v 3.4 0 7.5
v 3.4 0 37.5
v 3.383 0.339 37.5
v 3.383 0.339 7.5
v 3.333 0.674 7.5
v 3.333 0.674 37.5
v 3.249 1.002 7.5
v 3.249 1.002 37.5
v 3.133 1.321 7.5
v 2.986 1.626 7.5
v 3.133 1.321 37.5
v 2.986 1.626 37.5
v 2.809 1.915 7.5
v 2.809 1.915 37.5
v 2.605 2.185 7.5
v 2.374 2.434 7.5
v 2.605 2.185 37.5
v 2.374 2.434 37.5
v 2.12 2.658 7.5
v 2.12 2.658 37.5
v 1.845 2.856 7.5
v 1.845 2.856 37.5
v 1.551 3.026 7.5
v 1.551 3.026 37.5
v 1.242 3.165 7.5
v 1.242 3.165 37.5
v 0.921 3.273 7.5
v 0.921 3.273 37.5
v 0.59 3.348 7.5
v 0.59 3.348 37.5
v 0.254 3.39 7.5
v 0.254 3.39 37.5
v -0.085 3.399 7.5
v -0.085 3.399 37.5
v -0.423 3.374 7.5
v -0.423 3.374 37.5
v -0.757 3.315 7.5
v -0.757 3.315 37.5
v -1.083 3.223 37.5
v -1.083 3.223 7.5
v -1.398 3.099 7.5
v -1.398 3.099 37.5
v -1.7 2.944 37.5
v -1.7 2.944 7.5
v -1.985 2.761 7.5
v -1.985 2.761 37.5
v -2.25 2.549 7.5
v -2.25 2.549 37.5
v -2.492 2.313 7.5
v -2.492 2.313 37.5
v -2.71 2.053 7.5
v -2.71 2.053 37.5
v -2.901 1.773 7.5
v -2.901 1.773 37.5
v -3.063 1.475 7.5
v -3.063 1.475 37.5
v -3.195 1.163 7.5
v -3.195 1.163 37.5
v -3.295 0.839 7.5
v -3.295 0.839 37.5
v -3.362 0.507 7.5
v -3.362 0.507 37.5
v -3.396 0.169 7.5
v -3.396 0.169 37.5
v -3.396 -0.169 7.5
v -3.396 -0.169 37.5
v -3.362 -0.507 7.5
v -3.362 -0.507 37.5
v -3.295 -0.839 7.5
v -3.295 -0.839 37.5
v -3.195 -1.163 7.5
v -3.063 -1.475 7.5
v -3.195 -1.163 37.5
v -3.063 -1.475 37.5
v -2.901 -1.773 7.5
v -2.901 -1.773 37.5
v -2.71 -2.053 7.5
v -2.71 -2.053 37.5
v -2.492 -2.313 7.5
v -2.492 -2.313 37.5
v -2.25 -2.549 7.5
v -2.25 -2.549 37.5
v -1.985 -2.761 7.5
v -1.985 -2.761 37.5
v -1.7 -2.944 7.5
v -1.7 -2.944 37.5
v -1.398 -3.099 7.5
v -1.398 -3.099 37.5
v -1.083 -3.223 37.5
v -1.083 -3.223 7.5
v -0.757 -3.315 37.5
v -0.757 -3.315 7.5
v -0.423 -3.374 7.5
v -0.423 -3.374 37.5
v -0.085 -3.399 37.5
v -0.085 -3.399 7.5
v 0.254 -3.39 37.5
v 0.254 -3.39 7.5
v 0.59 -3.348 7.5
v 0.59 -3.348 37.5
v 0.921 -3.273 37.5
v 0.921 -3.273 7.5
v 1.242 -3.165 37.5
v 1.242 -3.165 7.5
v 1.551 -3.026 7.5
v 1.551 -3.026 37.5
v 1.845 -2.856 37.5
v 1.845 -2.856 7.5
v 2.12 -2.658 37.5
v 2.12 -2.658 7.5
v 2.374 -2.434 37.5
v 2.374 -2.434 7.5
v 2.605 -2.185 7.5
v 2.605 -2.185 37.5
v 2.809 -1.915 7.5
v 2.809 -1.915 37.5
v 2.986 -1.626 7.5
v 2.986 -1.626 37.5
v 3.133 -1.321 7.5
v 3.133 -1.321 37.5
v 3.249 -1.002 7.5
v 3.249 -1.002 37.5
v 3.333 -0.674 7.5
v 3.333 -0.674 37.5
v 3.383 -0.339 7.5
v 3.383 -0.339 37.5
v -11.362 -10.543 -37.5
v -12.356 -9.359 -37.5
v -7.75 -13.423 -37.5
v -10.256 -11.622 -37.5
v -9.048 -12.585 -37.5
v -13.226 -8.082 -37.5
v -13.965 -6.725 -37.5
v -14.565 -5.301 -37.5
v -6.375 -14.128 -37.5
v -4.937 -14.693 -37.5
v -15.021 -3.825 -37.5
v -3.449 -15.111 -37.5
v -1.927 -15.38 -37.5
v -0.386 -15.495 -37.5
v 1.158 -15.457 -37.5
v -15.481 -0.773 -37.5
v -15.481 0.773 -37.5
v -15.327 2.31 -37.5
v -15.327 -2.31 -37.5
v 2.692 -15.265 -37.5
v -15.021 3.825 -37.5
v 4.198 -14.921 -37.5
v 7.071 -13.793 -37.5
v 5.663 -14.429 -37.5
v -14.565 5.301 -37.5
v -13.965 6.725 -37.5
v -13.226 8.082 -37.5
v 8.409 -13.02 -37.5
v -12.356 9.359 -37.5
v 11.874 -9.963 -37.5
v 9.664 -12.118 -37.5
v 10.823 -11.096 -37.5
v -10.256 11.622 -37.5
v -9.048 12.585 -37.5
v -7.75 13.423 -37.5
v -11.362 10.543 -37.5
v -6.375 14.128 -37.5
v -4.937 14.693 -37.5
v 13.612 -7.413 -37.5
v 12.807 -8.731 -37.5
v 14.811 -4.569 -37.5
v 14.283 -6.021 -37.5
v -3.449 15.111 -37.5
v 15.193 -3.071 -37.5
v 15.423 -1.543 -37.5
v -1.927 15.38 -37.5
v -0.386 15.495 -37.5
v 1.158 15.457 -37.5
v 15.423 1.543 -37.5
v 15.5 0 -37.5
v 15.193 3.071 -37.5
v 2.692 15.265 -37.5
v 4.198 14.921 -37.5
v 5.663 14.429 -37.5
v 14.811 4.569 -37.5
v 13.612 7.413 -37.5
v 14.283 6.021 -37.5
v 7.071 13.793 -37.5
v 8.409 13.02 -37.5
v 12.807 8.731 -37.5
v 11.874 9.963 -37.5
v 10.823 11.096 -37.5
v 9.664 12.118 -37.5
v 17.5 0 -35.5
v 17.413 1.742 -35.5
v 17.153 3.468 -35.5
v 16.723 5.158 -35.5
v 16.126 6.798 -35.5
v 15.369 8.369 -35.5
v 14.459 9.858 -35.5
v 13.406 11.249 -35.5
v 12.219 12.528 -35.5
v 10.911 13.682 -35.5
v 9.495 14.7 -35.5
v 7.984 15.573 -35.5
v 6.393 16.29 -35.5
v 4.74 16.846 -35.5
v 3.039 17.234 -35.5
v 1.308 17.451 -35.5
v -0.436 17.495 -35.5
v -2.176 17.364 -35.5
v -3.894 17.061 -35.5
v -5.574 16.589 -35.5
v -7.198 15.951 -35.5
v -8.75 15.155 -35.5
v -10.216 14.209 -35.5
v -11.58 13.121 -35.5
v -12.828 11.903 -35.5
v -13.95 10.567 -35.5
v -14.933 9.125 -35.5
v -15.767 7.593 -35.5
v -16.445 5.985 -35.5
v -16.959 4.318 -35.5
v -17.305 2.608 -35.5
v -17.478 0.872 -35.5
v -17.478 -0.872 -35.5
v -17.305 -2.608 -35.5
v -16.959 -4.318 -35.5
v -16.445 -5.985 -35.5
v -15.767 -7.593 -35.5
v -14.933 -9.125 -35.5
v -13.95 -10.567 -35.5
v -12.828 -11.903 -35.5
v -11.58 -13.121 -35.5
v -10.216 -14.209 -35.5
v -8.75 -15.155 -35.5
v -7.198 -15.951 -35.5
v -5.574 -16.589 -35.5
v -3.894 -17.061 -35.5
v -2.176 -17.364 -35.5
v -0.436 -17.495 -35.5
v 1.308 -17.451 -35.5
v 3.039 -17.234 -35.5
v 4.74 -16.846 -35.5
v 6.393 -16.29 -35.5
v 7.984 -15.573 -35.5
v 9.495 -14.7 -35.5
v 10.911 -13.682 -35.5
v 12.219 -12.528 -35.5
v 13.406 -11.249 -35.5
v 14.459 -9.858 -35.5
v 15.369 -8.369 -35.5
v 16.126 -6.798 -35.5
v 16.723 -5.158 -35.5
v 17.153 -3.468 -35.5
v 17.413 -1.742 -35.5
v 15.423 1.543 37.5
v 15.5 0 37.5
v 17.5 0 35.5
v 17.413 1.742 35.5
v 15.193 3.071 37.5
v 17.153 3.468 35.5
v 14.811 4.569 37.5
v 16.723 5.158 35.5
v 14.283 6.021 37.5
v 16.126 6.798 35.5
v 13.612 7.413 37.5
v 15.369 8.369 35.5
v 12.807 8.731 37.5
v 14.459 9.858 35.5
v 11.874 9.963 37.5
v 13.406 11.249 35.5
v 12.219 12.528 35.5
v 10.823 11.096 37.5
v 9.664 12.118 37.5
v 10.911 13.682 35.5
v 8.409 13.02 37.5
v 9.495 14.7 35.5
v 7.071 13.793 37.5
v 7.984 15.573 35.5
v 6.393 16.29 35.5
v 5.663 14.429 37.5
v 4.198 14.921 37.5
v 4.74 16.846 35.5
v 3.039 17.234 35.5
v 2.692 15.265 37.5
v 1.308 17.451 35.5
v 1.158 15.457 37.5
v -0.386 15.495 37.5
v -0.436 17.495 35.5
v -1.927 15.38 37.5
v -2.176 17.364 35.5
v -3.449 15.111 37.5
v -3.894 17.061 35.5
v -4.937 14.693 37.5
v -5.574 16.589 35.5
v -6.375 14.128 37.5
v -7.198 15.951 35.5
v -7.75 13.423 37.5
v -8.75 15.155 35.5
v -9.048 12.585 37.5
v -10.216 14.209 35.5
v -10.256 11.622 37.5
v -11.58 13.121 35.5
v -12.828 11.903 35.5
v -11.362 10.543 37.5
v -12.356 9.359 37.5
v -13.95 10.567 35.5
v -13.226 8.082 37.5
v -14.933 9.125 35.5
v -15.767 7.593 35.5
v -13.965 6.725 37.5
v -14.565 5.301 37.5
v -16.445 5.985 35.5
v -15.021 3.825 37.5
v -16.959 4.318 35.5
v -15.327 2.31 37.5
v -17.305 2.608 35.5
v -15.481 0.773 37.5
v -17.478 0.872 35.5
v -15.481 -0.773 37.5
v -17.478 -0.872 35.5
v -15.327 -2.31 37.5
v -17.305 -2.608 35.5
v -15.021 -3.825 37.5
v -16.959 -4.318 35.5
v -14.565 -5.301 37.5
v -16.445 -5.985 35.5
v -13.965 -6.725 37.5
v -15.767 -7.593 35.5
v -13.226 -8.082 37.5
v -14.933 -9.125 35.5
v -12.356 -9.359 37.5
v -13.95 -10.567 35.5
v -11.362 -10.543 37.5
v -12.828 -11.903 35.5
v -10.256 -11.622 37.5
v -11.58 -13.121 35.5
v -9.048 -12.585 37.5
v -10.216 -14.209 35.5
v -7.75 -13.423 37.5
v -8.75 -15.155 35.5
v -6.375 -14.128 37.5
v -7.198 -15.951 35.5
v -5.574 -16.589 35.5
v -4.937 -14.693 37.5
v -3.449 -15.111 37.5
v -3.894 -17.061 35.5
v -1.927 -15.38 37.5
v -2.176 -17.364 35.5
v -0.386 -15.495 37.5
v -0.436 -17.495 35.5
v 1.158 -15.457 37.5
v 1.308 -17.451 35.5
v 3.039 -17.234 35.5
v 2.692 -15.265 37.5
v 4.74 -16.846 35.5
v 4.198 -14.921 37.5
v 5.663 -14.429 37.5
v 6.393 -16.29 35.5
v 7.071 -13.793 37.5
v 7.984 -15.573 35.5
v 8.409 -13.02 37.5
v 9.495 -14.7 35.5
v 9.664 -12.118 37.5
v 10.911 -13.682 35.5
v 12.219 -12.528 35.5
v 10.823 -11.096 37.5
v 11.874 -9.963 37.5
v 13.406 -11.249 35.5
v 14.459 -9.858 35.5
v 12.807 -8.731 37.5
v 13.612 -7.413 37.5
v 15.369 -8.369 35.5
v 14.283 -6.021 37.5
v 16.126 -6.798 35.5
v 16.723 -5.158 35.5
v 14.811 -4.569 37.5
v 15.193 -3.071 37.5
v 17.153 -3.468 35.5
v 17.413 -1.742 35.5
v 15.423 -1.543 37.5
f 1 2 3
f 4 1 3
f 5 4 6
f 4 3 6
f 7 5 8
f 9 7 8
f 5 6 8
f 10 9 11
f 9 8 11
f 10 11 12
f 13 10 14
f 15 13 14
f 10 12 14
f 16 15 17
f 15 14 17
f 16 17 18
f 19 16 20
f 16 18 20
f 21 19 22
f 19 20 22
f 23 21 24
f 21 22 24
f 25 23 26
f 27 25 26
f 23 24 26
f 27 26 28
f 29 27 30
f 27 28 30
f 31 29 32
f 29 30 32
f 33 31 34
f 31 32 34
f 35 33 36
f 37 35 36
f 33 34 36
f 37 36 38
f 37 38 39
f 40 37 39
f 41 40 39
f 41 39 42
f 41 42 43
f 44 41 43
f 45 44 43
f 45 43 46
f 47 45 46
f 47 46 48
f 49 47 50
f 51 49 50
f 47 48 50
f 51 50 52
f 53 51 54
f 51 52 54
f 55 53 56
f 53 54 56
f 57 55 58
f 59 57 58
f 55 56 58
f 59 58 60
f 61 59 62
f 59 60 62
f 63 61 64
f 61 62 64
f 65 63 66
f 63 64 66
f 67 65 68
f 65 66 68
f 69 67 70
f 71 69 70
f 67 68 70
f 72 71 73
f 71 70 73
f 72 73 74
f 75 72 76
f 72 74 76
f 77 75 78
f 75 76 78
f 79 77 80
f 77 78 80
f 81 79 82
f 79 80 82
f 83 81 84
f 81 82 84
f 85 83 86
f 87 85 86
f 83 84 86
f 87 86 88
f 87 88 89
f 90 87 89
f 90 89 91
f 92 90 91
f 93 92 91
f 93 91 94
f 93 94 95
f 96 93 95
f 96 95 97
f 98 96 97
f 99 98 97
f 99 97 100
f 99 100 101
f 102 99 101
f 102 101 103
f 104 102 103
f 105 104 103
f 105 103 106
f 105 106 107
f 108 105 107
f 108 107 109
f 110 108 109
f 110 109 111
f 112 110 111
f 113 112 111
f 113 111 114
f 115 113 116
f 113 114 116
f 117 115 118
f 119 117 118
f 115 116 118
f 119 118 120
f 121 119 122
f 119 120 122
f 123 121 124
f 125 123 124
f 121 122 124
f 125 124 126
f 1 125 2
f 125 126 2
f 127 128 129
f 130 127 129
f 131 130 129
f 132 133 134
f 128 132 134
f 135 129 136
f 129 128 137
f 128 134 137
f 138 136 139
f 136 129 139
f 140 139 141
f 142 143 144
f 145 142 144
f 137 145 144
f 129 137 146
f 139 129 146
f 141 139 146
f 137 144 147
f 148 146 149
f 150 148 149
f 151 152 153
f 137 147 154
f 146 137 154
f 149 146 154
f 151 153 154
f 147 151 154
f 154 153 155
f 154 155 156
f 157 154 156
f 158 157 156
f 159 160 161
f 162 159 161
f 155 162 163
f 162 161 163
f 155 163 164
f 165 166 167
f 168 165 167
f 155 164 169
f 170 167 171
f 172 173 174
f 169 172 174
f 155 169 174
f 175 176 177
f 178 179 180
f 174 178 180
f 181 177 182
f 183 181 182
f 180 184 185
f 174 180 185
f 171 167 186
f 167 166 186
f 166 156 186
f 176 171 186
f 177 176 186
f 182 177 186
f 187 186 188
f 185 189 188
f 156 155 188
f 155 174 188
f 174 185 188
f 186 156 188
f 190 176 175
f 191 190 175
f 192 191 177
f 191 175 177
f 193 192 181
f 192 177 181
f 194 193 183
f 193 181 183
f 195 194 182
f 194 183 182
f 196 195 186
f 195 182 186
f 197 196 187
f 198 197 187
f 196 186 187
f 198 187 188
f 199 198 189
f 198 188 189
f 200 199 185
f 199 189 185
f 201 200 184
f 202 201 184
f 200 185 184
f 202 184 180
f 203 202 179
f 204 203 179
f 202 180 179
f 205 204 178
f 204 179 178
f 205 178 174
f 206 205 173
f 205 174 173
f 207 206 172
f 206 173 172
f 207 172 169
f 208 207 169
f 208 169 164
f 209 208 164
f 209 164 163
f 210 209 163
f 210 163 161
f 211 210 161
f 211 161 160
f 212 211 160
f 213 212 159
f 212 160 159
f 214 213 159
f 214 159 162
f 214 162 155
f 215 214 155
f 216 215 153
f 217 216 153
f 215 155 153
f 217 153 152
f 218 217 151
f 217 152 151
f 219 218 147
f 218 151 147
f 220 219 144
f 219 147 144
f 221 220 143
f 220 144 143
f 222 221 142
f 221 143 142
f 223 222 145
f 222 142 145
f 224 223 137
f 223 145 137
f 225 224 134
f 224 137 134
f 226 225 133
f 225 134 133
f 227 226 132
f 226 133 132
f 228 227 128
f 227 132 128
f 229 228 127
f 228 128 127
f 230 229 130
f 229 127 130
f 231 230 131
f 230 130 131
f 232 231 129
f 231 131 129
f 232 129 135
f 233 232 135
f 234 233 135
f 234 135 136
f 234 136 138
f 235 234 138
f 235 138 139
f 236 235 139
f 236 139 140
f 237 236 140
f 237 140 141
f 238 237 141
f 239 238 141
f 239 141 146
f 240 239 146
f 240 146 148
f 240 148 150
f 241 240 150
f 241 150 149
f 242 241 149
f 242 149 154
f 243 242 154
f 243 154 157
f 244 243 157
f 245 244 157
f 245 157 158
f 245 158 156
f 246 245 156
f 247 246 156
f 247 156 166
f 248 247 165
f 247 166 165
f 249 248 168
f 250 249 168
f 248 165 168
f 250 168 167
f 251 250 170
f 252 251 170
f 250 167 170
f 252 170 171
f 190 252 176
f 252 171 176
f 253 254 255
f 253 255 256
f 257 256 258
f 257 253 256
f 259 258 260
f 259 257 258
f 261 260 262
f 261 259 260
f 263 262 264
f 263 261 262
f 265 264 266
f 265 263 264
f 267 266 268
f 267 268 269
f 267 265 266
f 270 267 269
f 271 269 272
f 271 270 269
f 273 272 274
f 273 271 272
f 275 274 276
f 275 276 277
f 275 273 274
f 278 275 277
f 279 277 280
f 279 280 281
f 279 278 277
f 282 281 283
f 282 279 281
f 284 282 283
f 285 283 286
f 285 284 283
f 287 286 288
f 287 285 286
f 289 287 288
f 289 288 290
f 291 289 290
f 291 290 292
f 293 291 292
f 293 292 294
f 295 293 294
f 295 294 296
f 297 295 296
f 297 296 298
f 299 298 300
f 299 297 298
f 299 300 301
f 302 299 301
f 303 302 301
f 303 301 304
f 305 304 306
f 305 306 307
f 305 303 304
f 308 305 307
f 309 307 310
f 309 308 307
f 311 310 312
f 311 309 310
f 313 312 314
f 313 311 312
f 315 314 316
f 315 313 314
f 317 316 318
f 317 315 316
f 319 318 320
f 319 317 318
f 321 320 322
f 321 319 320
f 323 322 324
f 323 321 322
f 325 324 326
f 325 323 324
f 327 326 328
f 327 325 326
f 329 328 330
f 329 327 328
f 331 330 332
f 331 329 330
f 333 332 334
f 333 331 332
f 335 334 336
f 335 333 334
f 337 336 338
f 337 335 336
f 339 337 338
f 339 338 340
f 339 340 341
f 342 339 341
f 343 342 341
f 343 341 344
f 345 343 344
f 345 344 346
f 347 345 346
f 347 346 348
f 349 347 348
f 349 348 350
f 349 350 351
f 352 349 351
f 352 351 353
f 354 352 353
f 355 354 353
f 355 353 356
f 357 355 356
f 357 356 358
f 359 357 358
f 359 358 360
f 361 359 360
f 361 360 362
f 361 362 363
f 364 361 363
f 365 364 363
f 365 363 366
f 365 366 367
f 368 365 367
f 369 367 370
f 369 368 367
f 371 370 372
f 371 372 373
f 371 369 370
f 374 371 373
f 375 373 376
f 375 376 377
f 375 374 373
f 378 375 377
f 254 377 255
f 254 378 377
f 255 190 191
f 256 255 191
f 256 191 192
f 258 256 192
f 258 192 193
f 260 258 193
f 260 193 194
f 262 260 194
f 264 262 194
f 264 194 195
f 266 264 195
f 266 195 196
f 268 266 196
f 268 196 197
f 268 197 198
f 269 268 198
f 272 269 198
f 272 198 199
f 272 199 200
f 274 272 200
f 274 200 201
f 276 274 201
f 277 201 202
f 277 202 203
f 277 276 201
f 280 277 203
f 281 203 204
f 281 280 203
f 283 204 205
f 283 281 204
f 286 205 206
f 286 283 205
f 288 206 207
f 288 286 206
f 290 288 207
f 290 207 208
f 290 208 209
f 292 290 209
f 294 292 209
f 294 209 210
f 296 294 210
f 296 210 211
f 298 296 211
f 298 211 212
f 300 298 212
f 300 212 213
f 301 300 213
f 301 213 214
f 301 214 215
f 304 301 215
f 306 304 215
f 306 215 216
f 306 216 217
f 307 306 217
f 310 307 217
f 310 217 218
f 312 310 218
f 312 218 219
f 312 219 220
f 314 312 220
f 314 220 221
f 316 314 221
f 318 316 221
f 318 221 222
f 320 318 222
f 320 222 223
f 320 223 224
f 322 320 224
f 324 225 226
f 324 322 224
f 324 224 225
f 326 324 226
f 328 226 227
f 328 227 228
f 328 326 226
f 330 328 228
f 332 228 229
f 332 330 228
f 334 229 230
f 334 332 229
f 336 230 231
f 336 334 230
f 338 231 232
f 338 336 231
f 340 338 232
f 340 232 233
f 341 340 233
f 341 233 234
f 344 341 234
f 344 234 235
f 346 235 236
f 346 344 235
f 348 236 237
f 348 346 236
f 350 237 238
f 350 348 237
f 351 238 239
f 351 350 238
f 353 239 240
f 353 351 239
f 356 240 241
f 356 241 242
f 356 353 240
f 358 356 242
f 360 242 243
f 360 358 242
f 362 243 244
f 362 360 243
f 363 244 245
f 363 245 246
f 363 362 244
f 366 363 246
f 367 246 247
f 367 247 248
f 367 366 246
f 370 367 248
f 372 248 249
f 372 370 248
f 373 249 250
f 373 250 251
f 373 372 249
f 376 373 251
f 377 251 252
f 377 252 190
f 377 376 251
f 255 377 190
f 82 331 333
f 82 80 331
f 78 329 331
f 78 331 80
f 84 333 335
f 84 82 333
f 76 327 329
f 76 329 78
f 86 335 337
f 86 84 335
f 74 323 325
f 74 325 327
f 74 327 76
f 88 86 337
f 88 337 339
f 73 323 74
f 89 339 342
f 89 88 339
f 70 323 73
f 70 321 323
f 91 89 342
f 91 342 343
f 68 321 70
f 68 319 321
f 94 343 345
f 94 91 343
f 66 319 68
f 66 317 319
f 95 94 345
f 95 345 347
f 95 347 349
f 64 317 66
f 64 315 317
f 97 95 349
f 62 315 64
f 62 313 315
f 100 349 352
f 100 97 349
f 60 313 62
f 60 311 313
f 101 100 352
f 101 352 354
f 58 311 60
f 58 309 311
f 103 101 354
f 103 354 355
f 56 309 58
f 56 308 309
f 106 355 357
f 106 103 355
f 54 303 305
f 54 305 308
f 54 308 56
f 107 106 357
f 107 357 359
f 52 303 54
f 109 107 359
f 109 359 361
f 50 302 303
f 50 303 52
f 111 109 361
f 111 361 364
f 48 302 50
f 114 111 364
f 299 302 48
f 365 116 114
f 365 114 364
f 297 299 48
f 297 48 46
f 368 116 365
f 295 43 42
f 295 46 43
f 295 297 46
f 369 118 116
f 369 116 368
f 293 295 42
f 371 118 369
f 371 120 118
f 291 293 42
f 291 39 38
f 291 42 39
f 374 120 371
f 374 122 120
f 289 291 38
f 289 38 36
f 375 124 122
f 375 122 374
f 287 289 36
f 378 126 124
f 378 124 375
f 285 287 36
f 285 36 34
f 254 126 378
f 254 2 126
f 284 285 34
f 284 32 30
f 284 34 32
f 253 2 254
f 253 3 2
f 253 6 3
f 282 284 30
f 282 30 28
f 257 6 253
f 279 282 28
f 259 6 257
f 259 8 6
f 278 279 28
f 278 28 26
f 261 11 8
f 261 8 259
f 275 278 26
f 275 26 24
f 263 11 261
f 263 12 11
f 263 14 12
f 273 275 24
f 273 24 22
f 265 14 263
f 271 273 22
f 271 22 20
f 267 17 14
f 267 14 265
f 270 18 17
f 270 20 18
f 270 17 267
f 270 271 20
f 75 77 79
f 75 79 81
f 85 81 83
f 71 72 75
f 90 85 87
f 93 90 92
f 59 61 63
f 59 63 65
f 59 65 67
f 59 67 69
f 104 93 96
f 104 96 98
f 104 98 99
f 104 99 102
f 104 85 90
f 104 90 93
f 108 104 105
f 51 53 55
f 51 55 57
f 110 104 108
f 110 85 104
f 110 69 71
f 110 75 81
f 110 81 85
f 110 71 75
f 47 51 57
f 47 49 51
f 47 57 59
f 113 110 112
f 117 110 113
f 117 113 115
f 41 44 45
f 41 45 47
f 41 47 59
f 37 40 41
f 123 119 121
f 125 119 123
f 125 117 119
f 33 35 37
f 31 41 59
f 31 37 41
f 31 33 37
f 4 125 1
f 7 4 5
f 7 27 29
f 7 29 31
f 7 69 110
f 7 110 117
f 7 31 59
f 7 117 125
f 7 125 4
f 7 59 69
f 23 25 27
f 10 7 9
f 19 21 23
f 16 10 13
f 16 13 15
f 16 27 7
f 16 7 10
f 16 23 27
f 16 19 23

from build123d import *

# Parameters (mm, degrees)
F0_R      = 17.5
F1_DEPTH  = 37.5
F2_R      = 4.25
F3_DEPTH  = 25
F4_SIZE   = 2
F6_R      = 17.5
F7_DEPTH  = 37.5
F8_R      = 4.25
F9_DEPTH  = 30
F10_SIZE  = 2
F11_R     = 5.5
F11_R_2   = 3.4
F12_DEPTH = 30


with BuildPart() as f1:
    # F0 (on Top) → F1 (new body, symmetric)
    with BuildSketch(Plane.XY):
        Circle(F0_R)
    extrude(amount=F1_DEPTH, both=True)

    # F2 (on face) → F3 (cut)
    with BuildSketch(Plane.XY.offset(37.5)):
        Circle(F2_R)
    extrude(amount=-F3_DEPTH, mode=Mode.SUBTRACT)

    # F4
    f4_edges = [f1.edges().sort_by_distance(p)[0] for p in [
        (-17.5, 0, 37.5),
        (-17.5, 0, -37.5),
    ]]
    chamfer(f4_edges, length=F4_SIZE)


with BuildPart() as f7:
    # F6 (on Top) → F7 (new body, symmetric)
    with BuildSketch(Plane.XY):
        Circle(F6_R)
    extrude(amount=F7_DEPTH, both=True)

    # F8 (on face) → F9 (cut)
    with BuildSketch(Plane.XY.offset(37.5)):
        Circle(F8_R)
    extrude(amount=-F9_DEPTH, mode=Mode.SUBTRACT)

    # F10
    f10_edges = [f7.edges().sort_by_distance(p)[0] for p in [
        (-17.5, 0, 37.5),
        (-17.5, 0, -37.5),
    ]]
    chamfer(f10_edges, length=F10_SIZE)

    # F11 (on face) → F12 (join)
    with BuildSketch(Plane.XY.offset(37.5)):
        Circle(F11_R)
        Circle(F11_R_2, mode=Mode.SUBTRACT)
    extrude(amount=-F12_DEPTH)


solid = f7.part
